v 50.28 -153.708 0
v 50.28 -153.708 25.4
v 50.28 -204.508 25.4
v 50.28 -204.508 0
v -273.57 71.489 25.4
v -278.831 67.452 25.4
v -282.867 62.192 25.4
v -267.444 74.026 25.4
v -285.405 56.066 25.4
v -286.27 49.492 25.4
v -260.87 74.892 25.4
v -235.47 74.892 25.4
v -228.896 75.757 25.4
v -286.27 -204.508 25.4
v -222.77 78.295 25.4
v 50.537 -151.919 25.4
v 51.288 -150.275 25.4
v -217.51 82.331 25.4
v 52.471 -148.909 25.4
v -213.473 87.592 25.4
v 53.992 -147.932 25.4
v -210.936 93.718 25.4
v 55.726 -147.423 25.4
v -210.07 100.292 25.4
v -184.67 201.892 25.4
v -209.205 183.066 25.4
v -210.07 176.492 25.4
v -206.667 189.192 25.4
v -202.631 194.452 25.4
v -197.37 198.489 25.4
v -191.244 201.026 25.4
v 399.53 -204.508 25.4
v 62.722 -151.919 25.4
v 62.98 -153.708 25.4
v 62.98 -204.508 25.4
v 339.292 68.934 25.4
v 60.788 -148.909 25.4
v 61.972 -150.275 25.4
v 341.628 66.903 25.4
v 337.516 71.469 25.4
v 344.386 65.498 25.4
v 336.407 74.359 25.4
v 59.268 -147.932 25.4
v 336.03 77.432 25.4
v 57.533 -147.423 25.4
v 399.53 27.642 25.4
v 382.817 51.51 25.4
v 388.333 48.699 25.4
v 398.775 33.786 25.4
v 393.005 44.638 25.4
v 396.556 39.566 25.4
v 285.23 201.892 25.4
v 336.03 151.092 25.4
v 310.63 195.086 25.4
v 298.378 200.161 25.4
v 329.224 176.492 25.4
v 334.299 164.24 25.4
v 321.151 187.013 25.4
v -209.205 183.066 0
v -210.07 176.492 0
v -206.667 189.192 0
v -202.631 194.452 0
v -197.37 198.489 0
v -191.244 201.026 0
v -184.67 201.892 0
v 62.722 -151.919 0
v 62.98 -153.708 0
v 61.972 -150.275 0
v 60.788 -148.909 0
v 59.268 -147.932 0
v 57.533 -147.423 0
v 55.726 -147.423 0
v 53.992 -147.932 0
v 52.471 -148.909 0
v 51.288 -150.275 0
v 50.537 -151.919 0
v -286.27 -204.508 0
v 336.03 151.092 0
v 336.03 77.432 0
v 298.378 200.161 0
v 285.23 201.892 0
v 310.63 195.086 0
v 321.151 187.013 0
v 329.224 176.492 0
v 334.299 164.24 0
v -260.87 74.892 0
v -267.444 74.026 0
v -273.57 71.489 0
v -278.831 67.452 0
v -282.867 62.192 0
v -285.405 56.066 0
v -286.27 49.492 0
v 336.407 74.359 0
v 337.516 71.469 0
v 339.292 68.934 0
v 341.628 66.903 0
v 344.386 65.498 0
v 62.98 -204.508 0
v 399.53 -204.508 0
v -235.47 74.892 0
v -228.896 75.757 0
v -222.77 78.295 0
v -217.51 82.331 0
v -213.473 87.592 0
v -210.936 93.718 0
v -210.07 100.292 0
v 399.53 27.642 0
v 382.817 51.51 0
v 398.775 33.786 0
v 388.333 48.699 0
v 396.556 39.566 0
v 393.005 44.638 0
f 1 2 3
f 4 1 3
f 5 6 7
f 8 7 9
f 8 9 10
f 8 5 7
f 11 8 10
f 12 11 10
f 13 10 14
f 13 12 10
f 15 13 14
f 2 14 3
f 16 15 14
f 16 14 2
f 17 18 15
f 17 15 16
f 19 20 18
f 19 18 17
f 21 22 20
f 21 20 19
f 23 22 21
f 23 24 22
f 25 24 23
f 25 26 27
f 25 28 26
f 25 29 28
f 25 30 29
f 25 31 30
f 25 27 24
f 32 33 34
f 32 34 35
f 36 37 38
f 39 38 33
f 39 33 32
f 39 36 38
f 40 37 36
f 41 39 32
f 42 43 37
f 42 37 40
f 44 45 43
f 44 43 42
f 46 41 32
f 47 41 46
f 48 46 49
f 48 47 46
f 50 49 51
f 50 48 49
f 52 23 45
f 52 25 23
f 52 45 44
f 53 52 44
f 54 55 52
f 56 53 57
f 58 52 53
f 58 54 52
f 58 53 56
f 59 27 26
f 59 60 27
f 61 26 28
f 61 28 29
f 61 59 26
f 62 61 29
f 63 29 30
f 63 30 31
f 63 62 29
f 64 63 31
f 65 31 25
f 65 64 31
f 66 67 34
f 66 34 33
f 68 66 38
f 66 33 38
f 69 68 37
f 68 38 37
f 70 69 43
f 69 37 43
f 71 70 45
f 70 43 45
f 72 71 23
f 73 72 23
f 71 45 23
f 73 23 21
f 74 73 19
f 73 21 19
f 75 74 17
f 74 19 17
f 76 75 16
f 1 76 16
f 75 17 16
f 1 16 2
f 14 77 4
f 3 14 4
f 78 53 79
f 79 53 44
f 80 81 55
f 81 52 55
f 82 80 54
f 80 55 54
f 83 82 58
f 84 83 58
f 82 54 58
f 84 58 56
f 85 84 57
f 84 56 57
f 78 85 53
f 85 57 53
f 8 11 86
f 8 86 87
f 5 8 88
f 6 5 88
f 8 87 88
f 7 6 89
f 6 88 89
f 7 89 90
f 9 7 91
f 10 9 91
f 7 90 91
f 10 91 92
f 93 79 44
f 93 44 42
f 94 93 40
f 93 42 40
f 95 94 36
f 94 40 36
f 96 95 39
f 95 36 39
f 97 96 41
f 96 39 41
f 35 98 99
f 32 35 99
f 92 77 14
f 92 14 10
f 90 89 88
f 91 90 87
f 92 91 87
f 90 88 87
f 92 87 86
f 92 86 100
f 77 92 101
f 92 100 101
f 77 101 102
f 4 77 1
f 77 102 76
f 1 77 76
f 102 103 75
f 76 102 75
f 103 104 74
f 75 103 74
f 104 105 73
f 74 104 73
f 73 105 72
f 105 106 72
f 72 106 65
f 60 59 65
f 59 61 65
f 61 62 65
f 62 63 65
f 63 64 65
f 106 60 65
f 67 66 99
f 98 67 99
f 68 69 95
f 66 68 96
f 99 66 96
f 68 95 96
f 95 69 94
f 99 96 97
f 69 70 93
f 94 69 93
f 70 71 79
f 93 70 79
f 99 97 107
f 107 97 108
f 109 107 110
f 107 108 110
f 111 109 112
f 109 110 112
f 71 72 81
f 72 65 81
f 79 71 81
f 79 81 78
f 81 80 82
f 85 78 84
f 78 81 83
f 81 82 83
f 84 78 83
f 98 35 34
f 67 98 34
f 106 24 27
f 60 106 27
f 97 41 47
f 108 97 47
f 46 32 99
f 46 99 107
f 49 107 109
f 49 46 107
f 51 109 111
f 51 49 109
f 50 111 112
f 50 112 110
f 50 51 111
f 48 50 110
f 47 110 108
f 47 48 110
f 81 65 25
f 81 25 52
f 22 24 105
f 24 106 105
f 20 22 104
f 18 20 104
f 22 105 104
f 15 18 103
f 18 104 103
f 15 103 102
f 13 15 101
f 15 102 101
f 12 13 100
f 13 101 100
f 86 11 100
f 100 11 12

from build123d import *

# Parameters (mm, degrees)
F0_W      = 698.5
F0_H      = 406.4
F1_DEPTH  = 25.4
F3_DEPTH  = 25.4
F4_W      = 12.7
F4_H      = 254
F5_DEPTH  = 25.4
F6_R      = 50.8
F7_W      = 76.2
F7_H      = 127
F8_DEPTH  = 25.4
F9_R      = 25.4
F10_R     = 25.4
F12_DEPTH = 25.401


with BuildPart() as f1:
    # F0 (on Top) → F1 (new body)
    with BuildSketch(Plane.XY):
        with Locations((62.9796185677, -1.3083405793)):
            Rectangle(F0_W, F0_H)
    extrude(amount=F1_DEPTH)

    # F2 (on face) → F3 (cut)
    with BuildSketch(Plane.XY.offset(25.4)):
        with BuildLine():
            Line((336.0296185677, 284.5435195792), (336.0296185677, 77.4316594207))
            ThreePointArc((336.0296185677, 77.4316594207), (338.3263876052, 70.1472386791), (344.3859627474, 65.4975631367))
            Line((344.3859627474, 65.4975631367), (488.1807398124, 13.1605444421))
            Line((488.1807398124, 13.1605444421), (504.1641078178, 284.5435195792))
            Line((504.1641078178, 284.5435195792), (336.0296185677, 284.5435195792))
        make_face()
    extrude(amount=-F3_DEPTH, mode=Mode.SUBTRACT)

    # F4 (on face) → F5 (cut)
    with BuildSketch(Plane.XY.offset(25.4)):
        with Locations((405.8796185677, -77.5083405793)):
            Rectangle(F4_W, F4_H)
    extrude(amount=-F5_DEPTH, mode=Mode.SUBTRACT)

    # F6
    f6_edges = [f1.edges().sort_by_distance(p)[0] for p in [
        (336.029619, 201.891659, 12.7),
    ]]
    fillet(f6_edges, radius=F6_R)

    # F7 (on face) → F8 (cut)
    with BuildSketch(Plane.XY.offset(25.4)):
        with Locations((-248.1703814323, 138.3916594207)):
            Rectangle(F7_W, F7_H)
    extrude(amount=-F8_DEPTH, mode=Mode.SUBTRACT)

    # F9
    f9_edges = [f1.edges().sort_by_distance(p)[0] for p in [
        (-210.070381, 74.891659, 12.7),
    ]]
    fillet(f9_edges, radius=F9_R)

    # F10
    f10_edges = [f1.edges().sort_by_distance(p)[0] for p in [
        (-210.070381, 201.891659, 12.7),
        (-286.270381, 74.891659, 12.7),
        (399.529619, 45.426914, 12.7),
    ]]
    fillet(f10_edges, radius=F10_R)

    # F11 (on face) → F12 (cut, through all)
    with BuildSketch(Plane.XY.offset(25.4)):
        with BuildLine():
            Line((62.9796185677, -212.4609104405), (62.9796185677, -153.7083405793))
            ThreePointArc((62.9796185677, -153.7083405793), (56.6296185677, -147.3583405793), (50.2796185677, -153.7083405793))
            Line((50.2796185677, -153.7083405793), (50.2796185677, -204.7673902215))
            Line((50.2796185677, -204.7673902215), (62.9796185677, -212.4609104405))
        make_face()
    extrude(amount=-F12_DEPTH, mode=Mode.SUBTRACT)


solid = f1.part
